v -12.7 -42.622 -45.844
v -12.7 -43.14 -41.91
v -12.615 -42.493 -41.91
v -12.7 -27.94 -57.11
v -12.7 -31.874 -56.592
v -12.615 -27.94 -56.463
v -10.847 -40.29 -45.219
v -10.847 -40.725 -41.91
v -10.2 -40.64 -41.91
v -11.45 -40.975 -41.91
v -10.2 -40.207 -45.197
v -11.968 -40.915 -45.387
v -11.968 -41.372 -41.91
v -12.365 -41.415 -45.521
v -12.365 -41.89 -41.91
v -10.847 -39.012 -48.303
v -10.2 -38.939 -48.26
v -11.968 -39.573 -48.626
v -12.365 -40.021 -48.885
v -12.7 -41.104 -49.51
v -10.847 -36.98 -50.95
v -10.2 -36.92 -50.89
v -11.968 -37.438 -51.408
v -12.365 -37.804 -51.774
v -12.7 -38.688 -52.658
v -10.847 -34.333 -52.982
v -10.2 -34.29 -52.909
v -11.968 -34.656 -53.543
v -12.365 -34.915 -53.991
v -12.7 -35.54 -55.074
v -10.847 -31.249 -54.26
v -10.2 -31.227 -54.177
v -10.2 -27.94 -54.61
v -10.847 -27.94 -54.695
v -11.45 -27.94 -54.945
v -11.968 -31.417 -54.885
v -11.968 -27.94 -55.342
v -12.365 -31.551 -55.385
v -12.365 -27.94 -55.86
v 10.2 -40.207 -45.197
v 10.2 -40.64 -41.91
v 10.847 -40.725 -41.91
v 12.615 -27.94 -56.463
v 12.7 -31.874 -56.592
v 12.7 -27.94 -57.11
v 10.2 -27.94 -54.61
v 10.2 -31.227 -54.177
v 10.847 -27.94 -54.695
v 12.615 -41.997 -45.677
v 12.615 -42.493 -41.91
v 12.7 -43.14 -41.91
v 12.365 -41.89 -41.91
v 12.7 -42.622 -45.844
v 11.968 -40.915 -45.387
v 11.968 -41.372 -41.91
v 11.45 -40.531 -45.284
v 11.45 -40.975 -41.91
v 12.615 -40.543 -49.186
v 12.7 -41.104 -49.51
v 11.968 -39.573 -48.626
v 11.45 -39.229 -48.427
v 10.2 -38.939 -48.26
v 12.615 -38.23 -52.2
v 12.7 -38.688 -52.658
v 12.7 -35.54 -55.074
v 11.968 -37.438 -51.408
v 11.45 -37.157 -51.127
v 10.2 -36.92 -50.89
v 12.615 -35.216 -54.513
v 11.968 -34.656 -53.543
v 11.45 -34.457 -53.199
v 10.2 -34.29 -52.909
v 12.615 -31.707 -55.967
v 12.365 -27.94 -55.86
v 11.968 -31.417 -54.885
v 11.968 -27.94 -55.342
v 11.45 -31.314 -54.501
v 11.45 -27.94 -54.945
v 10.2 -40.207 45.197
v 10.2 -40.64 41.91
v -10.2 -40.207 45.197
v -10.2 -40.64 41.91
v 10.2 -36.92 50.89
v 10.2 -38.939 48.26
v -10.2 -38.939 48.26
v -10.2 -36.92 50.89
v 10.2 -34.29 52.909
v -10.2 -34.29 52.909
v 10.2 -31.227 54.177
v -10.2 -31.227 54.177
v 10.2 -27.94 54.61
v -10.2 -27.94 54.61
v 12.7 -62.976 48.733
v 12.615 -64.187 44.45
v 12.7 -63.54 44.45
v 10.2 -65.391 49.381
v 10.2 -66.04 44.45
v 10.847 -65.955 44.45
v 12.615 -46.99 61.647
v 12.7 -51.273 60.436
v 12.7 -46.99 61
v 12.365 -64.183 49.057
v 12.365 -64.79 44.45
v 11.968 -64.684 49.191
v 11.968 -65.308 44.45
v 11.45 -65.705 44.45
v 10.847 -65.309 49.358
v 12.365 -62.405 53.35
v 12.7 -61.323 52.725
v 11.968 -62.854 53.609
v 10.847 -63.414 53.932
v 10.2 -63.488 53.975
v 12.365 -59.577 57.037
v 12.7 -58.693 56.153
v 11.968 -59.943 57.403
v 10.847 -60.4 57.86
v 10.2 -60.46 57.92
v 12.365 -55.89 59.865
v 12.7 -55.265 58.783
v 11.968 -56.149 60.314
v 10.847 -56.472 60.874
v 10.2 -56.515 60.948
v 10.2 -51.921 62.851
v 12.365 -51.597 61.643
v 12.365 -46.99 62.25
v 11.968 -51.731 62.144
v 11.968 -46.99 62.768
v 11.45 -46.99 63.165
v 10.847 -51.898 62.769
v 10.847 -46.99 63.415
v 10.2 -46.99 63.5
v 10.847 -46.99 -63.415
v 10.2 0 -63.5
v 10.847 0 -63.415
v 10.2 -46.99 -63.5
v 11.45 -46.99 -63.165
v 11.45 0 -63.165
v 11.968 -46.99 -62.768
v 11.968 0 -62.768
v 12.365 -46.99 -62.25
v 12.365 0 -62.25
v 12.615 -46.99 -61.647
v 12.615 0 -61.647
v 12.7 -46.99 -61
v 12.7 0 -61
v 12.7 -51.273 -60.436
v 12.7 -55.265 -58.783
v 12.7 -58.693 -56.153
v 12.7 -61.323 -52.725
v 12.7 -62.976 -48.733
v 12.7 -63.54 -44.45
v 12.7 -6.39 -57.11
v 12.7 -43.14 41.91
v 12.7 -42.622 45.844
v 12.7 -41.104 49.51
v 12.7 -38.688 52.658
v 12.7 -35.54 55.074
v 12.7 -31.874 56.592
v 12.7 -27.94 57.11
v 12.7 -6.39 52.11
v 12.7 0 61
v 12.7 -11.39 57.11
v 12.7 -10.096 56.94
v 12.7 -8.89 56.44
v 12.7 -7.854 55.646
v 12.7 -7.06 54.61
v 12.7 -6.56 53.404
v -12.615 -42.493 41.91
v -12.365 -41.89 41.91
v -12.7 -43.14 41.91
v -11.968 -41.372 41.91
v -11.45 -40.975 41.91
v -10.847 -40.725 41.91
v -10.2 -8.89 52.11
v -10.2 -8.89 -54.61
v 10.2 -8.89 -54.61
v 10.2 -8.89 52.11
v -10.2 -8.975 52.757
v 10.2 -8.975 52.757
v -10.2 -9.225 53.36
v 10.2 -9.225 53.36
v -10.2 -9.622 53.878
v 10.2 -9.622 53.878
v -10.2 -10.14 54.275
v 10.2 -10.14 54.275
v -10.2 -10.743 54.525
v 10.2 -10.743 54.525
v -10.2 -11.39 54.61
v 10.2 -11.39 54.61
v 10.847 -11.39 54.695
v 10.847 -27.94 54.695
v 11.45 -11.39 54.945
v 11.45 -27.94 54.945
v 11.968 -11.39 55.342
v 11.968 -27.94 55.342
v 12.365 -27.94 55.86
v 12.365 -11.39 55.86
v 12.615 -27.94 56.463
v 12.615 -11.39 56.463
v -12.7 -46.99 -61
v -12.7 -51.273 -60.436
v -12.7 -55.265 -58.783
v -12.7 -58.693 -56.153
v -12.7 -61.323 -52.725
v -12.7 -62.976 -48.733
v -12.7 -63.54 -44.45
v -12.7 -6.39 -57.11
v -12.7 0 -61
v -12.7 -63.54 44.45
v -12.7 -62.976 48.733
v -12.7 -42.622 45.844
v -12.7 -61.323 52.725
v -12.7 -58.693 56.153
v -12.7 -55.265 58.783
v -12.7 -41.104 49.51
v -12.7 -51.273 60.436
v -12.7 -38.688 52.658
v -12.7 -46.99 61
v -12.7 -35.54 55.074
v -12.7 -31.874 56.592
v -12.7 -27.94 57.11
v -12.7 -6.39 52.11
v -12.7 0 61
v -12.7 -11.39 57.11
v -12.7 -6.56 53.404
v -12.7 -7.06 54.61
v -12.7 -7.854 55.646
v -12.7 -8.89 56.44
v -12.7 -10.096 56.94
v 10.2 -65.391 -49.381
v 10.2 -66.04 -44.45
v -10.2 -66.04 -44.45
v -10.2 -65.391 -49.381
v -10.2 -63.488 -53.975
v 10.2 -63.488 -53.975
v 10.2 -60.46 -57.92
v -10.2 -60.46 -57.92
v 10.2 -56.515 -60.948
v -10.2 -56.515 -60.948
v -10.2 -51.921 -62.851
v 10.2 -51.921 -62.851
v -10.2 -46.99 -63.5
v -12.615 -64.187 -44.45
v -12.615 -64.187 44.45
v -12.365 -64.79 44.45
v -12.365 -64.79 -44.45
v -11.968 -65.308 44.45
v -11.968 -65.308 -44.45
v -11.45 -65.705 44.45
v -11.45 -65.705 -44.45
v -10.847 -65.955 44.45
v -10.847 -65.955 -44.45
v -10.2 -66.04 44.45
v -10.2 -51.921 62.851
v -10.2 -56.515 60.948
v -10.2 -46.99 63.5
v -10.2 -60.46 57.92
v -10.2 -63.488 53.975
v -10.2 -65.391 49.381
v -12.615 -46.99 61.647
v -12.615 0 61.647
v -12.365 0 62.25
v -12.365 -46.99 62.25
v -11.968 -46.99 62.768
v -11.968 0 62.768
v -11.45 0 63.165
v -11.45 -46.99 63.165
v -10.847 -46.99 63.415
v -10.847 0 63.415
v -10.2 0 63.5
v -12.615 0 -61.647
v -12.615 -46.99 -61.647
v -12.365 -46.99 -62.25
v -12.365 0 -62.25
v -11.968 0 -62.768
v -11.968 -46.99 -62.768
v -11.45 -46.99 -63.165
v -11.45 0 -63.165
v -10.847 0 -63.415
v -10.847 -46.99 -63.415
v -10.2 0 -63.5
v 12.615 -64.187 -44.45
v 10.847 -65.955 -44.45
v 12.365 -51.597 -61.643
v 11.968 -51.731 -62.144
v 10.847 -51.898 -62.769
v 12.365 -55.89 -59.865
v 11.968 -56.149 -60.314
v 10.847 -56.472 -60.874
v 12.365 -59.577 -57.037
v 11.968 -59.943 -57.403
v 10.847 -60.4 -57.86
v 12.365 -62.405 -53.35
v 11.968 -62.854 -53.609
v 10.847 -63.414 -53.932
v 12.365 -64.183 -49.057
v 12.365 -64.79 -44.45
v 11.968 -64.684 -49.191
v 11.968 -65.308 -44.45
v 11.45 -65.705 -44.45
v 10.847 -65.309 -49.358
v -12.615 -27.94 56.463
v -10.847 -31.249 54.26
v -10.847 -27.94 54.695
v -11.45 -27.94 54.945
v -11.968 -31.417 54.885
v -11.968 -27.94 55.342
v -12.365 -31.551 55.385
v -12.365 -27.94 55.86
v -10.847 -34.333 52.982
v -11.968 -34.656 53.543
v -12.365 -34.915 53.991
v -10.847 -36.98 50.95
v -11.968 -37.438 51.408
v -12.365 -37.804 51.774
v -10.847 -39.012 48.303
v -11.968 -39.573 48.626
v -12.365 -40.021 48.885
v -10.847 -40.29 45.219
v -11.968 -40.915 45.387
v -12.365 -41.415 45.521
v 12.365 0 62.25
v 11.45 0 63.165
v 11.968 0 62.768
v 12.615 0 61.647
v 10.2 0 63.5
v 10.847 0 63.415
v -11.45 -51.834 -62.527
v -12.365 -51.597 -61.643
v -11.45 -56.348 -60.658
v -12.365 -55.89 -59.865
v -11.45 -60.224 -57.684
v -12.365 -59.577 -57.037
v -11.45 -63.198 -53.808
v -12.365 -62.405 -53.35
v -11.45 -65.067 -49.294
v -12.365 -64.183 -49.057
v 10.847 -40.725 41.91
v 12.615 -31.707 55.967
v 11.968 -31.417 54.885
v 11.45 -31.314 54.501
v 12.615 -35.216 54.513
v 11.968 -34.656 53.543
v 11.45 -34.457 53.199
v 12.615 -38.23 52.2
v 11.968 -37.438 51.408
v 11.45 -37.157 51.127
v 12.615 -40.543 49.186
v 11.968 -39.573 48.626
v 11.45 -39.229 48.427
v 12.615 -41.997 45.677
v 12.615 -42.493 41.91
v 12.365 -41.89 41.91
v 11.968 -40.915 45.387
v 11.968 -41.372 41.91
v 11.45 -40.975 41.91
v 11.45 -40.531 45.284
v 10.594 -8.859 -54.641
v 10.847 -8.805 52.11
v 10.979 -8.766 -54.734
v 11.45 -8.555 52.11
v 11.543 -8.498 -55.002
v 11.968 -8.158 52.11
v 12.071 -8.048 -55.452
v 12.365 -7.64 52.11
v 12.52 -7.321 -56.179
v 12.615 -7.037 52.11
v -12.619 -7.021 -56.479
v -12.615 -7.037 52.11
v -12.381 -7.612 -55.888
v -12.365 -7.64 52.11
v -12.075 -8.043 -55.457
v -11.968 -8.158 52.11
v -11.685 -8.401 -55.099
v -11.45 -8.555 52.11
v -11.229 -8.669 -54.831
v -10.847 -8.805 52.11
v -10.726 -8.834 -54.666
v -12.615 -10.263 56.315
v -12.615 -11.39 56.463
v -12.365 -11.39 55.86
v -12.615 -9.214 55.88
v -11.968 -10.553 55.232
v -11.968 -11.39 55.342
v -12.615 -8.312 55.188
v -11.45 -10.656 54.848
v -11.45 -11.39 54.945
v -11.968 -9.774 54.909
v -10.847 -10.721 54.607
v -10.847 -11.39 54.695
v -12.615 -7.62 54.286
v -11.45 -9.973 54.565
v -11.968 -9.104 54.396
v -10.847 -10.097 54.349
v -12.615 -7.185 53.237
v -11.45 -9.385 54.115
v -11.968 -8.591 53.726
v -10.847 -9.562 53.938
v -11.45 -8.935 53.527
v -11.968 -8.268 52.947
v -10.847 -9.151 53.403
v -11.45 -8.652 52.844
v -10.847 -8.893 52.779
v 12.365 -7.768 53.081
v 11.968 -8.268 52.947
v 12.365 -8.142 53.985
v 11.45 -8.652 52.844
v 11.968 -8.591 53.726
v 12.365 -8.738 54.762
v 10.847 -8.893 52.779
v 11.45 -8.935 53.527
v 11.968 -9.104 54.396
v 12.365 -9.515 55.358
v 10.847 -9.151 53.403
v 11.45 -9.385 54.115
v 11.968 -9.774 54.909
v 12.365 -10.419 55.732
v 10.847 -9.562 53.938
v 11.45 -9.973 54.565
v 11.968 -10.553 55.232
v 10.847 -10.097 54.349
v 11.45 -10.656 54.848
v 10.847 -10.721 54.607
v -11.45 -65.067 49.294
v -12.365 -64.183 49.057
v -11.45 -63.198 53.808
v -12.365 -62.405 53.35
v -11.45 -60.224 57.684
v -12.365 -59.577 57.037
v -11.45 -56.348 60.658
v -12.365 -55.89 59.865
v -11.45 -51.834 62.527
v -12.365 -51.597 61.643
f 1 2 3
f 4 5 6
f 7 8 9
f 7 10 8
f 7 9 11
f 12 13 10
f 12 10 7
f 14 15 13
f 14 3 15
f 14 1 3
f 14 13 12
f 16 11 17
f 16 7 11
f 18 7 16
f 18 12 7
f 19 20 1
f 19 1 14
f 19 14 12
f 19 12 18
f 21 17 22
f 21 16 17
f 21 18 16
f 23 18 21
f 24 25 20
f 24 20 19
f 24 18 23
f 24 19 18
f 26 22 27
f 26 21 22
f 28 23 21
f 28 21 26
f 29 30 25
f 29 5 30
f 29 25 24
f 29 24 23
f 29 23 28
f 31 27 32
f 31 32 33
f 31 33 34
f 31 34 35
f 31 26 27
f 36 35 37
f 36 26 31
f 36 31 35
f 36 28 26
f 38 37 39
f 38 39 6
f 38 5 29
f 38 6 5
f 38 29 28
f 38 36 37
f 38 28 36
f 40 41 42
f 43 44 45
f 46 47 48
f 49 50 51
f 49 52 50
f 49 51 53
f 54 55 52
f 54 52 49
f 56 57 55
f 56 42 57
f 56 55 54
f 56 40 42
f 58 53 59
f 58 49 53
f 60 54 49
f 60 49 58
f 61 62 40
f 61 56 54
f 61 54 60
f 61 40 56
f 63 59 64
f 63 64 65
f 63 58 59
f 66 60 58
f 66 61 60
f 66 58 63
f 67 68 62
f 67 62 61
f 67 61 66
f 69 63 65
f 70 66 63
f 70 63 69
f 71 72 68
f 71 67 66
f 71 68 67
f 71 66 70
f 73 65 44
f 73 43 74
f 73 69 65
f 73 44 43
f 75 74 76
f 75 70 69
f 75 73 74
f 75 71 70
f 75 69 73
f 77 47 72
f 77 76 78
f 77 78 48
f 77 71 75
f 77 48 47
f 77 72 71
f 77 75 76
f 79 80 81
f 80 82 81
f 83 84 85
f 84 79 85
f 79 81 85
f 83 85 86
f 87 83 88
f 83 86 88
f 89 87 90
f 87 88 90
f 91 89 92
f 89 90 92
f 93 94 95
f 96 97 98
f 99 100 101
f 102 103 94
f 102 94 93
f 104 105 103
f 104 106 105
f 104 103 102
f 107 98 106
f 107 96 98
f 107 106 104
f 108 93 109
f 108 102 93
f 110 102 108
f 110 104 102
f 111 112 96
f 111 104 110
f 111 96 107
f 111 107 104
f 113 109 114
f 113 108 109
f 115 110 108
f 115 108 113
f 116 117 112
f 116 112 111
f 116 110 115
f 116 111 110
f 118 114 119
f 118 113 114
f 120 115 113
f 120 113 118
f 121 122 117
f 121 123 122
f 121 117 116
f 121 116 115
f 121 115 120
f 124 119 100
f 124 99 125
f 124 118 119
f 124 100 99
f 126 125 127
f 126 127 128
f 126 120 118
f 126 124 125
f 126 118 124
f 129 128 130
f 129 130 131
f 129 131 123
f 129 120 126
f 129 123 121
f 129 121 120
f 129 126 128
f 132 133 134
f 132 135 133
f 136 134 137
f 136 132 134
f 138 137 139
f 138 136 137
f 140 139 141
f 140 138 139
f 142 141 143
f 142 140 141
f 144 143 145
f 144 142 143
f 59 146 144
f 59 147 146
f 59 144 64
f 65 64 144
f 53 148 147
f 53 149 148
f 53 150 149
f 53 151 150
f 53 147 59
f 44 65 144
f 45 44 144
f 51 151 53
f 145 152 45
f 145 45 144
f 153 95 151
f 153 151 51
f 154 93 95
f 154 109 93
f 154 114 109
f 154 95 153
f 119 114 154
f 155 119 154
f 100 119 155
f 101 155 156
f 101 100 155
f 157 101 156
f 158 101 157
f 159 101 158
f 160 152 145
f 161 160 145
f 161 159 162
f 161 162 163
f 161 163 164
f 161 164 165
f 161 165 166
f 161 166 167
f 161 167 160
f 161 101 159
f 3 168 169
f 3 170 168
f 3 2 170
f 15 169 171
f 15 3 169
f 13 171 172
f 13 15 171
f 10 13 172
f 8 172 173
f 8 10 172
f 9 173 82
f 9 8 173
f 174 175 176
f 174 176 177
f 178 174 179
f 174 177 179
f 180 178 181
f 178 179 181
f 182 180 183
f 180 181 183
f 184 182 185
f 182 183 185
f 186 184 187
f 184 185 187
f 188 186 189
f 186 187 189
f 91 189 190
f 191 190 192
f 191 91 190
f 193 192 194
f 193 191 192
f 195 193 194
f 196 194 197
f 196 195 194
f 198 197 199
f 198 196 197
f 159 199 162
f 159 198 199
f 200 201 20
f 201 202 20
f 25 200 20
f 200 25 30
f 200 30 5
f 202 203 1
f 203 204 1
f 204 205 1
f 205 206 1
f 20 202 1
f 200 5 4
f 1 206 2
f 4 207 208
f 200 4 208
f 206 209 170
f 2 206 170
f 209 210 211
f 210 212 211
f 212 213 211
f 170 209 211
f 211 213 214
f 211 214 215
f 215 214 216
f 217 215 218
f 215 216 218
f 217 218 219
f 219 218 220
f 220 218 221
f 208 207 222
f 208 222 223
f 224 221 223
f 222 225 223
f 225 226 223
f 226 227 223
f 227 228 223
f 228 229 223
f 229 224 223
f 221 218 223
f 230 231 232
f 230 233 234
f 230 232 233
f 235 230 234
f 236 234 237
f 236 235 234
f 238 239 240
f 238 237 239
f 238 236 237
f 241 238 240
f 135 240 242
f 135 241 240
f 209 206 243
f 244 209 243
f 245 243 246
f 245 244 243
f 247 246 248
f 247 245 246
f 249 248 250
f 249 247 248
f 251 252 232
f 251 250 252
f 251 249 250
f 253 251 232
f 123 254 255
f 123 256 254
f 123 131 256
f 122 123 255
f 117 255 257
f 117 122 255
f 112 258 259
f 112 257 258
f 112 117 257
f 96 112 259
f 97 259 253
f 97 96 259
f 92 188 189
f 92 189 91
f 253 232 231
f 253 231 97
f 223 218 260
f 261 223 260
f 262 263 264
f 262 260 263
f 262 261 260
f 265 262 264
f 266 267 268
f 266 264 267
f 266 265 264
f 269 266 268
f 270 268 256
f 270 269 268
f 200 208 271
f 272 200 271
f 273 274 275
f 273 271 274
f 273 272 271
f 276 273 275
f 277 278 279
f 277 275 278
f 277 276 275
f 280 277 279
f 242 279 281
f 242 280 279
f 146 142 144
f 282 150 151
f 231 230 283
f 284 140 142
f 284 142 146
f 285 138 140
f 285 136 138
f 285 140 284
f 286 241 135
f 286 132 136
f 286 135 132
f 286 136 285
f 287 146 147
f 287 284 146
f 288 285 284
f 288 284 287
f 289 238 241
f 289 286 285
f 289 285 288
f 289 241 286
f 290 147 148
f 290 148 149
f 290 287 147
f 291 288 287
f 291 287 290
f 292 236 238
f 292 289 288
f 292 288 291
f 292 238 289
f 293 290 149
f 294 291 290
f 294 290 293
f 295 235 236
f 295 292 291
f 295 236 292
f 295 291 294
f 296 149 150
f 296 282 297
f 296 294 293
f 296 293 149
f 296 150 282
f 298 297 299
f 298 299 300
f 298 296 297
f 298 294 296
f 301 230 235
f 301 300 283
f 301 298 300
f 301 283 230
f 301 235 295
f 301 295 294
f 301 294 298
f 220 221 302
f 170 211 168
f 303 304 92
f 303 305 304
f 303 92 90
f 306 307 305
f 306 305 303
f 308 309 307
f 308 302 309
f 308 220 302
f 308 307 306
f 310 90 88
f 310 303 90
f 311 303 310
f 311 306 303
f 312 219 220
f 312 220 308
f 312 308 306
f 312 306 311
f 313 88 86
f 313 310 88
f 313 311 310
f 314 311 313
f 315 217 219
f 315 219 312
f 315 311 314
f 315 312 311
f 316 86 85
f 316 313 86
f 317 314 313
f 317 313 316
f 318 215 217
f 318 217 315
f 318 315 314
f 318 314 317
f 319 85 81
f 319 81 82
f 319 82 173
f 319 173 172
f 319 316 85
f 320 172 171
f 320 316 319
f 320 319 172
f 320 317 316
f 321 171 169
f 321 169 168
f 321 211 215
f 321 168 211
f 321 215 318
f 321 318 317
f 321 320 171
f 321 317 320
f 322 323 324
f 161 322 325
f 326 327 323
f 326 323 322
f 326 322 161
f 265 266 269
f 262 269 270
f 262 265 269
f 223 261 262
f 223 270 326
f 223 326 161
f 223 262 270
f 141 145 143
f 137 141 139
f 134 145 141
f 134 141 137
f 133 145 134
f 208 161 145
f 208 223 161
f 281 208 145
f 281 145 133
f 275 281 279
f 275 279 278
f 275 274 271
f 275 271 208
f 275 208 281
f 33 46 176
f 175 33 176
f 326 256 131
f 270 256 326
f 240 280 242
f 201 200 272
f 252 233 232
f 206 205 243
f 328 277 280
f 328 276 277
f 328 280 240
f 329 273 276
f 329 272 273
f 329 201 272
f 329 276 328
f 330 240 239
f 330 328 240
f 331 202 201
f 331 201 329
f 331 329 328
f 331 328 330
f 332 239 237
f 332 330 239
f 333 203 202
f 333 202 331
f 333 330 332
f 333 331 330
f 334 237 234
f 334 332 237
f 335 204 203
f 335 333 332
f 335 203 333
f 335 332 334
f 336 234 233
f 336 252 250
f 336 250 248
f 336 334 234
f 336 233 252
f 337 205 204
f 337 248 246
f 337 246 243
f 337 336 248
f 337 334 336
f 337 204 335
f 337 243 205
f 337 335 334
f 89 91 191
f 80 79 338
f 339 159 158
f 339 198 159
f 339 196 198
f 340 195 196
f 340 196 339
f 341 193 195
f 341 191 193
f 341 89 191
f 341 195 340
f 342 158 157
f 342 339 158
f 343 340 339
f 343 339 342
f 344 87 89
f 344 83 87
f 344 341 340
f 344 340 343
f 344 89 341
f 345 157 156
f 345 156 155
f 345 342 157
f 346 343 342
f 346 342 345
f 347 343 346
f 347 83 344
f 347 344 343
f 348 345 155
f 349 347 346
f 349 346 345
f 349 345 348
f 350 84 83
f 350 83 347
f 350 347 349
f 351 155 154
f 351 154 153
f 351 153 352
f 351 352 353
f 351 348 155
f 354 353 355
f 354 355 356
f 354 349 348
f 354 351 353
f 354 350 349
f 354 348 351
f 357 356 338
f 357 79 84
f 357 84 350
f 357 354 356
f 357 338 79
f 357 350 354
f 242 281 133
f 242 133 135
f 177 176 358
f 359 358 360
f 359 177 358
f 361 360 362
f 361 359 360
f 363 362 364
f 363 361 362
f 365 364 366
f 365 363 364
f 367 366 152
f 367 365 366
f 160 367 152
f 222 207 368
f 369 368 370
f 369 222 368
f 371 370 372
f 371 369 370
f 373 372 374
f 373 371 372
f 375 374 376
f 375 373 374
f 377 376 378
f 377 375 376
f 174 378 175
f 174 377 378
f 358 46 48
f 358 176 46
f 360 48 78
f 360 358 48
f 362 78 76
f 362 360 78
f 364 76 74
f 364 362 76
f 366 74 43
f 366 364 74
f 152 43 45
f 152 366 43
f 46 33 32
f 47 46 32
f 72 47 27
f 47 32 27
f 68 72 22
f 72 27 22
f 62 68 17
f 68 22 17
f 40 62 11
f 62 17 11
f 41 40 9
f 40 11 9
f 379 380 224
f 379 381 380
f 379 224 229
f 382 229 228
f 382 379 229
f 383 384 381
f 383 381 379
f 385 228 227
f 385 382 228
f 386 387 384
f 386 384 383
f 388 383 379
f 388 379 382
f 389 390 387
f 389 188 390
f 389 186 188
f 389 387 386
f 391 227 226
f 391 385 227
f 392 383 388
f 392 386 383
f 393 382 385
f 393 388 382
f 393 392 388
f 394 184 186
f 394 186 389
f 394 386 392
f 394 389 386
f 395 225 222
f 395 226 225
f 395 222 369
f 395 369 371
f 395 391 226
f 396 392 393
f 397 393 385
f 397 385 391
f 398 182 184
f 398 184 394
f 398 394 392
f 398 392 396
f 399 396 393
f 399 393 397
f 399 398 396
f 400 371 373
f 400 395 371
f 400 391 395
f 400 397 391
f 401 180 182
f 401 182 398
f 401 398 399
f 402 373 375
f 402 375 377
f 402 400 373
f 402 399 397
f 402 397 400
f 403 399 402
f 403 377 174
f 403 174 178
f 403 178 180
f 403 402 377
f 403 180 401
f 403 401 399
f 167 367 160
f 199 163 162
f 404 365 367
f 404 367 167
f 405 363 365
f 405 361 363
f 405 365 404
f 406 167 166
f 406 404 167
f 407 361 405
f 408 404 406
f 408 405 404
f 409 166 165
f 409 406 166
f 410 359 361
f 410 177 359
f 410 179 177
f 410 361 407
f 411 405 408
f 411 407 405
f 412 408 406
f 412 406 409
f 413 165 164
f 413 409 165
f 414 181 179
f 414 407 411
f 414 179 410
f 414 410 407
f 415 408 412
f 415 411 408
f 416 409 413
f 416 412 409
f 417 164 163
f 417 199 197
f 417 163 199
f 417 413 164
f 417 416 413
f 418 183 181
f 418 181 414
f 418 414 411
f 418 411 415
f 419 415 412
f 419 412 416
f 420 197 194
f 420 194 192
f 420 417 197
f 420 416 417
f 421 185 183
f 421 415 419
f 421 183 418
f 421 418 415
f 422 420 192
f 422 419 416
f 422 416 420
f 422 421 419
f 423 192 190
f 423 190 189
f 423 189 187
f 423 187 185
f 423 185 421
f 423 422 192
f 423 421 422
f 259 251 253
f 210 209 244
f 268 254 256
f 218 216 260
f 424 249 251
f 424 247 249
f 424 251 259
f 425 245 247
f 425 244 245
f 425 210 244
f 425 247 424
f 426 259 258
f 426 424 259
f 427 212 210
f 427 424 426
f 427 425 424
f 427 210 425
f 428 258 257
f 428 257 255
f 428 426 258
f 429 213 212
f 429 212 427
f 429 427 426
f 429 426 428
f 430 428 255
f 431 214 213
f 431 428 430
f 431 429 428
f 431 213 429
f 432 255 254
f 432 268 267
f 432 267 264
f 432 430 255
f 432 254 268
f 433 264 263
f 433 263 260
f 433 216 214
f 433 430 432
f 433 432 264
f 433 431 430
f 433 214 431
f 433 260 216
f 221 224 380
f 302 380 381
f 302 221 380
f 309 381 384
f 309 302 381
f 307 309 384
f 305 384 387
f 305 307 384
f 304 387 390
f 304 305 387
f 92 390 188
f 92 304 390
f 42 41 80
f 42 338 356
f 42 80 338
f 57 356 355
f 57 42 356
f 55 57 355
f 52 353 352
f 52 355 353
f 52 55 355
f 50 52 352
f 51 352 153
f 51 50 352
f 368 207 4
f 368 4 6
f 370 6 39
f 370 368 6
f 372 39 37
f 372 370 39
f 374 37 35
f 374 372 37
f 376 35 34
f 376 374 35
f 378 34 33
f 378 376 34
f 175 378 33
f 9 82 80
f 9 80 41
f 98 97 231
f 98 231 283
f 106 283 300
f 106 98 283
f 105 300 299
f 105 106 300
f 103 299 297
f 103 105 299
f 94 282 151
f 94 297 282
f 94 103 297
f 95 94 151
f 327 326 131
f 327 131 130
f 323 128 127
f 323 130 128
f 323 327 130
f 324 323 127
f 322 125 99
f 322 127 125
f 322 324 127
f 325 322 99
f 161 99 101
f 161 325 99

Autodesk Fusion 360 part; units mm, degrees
sketch "Sketch1" plane through (0, 0, 0) normal (1, 0, 0) x (0, 1, 0)
  line L0 (-66.04, 63.5) -> (0, 63.5)
  line L1 (0, 63.5) -> (0, -63.5)
  line L2 (0, -63.5) -> (-66.04, -63.5)
  line L3 (-66.04, -63.5) -> (-66.04, 63.5)
  line L4 (-8.89, 54.61) -> (-40.64, 54.61)
  line L5 (-40.64, 54.61) -> (-40.64, -54.61)
  line L6 (-40.64, -54.61) -> (-8.89, -54.61)
  line L7 (-8.89, -54.61) -> (-8.89, 54.61)
  dimension "d1" = 127
  dimension "d2" = 31.75
  dimension "d3" = 8.89
  dimension "d4" = 8.89
  dimension "d5" = 25.4
  dimension "d6" = 8.89
extrude "Extrude1" add sketch "Sketch1" along normal mid plane 25.4
fillet "Fillet1" radius 12.7 1 edges at (0, -40.64, -54.61)
fillet "Fillet2" radius 12.7 1 edges at (0, -40.64, 54.61)
fillet "Fillet3" radius 19.05 1 edges at (0, -66.04, 63.5)
fillet "Fillet4" radius 19.05 1 edges at (0, -66.04, -63.5)
sketch "Sketch2" plane through (0, -66.04, 0) normal (0, -1, 0) x (1, 0, 0)
  line L0 (-12.7, -44.45) -> (12.7, -44.45)
  line L1 (12.7, -44.45) -> (12.7, 44.45)
  line L2 (12.7, 44.45) -> (-12.7, 44.45)
  line L3 (-12.7, 44.45) -> (-12.7, -44.45)
  line L4 (7.181, -50.5634) -> (7.181, 50.5634) construction
  line L5 (7.181, 50.5634) -> (-7.181, 50.5634) construction
  line L6 (-7.181, 50.5634) -> (-7.181, -50.5634) construction
  line L7 (-7.181, -50.5634) -> (7.181, -50.5634) construction
  dimension "d17" = 12.7
extrude "Extrude2" [suppressed]
fillet "Fillet5" radius 2.5 23 edges at (12.7, -8.89, 0) (0, -8.89, 54.61) (12.7, -18.415, -54.61) (12.7, -36.9203, -50.8903) (12.7, -40.64, 0) (12.7, -36.9203, 50.8903) (12.7, -18.415, 54.61) (-12.7, -8.89, 0) (-12.7, -18.415, 54.61) (-12.7, -36.9203, 50.8903) (-12.7, -40.64, 0) (-12.7, -36.9203, -50.8903) (-12.7, -18.415, -54.61) (12.7, -23.495, 63.5) (12.7, -60.4604, 57.9204) (12.7, -66.04, 0) (12.7, -60.4604, -57.9204) (12.7, -23.495, -63.5) (-12.7, -23.495, 63.5) (-12.7, -60.4604, 57.9204) (-12.7, -66.04, 0) (-12.7, -60.4604, -57.9204) (-12.7, -23.495, -63.5)
